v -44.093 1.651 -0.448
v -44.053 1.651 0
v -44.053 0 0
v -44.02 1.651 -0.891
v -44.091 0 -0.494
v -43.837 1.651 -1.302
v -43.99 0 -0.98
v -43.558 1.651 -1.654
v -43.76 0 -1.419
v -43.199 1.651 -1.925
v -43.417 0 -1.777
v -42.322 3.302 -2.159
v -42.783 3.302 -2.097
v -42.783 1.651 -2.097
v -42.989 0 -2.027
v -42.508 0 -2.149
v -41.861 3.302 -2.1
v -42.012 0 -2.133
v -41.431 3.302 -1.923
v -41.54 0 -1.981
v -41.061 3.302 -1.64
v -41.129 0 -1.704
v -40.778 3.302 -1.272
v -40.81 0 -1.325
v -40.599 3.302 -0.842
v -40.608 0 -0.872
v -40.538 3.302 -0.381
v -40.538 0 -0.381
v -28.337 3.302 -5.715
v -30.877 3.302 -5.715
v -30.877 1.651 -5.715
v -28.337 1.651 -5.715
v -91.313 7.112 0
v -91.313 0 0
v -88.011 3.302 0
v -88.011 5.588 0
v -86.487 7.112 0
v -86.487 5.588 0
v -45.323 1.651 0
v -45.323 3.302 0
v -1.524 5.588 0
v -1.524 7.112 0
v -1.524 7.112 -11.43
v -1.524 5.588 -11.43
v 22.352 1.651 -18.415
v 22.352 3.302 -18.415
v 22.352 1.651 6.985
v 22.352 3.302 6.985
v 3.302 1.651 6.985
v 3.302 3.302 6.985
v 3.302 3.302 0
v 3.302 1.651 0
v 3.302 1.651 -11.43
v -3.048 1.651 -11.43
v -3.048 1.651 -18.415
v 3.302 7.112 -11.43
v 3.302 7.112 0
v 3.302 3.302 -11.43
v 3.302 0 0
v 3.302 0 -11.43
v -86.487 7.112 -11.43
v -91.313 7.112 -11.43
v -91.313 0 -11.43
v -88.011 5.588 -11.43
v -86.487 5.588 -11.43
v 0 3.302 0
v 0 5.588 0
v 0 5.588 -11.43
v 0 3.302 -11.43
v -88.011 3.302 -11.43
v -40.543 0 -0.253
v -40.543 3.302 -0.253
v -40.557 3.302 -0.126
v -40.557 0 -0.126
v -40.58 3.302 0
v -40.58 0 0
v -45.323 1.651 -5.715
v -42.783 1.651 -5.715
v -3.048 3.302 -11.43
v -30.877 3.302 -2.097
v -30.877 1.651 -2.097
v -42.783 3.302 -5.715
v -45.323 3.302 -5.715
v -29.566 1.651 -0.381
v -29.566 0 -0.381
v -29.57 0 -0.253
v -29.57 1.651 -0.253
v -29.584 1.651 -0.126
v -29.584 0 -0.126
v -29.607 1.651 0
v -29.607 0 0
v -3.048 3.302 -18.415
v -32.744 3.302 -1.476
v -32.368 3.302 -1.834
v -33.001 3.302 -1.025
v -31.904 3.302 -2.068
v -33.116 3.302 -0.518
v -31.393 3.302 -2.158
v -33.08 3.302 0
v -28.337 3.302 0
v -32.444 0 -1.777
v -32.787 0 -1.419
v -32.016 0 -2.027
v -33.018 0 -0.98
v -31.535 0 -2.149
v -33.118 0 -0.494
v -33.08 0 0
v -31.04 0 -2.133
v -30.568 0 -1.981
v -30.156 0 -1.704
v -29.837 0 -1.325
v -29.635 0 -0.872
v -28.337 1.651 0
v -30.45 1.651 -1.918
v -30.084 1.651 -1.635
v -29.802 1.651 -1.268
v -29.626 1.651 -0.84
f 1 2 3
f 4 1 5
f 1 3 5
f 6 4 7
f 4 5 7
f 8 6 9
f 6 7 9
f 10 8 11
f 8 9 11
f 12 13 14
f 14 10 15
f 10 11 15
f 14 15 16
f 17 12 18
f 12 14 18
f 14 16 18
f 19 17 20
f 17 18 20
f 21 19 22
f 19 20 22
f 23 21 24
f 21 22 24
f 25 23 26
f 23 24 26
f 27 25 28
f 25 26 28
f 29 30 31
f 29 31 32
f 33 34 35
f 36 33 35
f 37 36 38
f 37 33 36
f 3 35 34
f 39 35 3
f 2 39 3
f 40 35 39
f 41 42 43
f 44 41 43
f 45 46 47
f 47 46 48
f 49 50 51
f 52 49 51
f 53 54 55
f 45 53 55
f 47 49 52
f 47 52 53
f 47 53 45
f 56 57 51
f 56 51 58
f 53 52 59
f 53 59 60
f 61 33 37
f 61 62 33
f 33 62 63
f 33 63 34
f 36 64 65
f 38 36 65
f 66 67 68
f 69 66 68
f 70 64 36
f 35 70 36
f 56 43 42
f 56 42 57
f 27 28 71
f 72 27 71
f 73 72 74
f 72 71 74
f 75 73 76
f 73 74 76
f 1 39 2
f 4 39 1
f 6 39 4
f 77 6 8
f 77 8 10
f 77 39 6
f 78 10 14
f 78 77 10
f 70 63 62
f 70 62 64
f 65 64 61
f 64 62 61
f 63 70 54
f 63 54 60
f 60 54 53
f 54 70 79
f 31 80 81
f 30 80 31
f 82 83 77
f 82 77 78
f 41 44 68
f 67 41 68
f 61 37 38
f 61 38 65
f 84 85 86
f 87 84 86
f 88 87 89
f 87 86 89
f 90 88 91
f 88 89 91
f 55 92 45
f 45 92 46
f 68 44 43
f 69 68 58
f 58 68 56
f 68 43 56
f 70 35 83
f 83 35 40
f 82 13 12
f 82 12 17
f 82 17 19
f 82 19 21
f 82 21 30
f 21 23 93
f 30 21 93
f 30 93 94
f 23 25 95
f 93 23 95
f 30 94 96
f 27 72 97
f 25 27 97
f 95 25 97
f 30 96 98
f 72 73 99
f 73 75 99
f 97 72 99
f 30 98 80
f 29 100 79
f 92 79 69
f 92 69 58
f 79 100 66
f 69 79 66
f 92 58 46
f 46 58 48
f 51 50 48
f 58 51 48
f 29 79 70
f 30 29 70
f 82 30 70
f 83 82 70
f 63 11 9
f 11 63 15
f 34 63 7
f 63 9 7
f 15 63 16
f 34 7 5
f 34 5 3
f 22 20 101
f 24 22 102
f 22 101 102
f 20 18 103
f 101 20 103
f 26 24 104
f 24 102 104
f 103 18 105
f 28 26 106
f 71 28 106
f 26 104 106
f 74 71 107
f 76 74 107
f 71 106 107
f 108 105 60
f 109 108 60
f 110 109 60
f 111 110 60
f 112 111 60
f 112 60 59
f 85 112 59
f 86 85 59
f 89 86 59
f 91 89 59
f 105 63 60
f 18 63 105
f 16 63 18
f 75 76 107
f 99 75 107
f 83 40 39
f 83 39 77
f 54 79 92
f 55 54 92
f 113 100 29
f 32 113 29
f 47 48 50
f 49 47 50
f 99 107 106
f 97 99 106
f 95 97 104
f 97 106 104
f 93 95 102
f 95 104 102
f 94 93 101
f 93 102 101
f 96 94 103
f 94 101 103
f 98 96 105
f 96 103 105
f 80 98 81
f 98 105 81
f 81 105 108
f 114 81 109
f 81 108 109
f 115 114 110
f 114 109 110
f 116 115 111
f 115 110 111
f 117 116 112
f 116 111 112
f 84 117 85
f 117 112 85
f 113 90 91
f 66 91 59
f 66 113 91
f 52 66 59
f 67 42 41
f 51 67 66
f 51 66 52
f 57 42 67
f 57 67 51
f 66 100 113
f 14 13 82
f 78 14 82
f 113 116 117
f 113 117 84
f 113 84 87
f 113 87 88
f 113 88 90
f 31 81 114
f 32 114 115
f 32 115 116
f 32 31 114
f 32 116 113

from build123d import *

# Parameters (mm, degrees)
BOSS_EXTRUDE1_DEPTH = 3.302
SKETCH2_W           = 11.43
SKETCH2_H           = 7.112
BOSS_EXTRUDE2_DEPTH = 3.302
SKETCH3_W           = 11.43
SKETCH3_H           = 7.112
BOSS_EXTRUDE3_DEPTH = 3.302
SKETCH4_W           = 1.524
SKETCH4_H           = 11.43
BOSS_EXTRUDE4_DEPTH = 1.524
SKETCH5_W           = 1.524
SKETCH5_H           = 11.43
BOSS_EXTRUDE5_DEPTH = 1.524
SKETCH7_W           = 2.54
SKETCH7_H           = 5.715
CUT_EXTRUDE1_DEPTH  = 1.651
BOSS_EXTRUDE8_START = -3.302
BOSS_EXTRUDE8_DEPTH = 1.651


with BuildPart() as part:
    # Sketch1 → Boss-Extrude1 (new body)
    with BuildSketch(Plane(origin=(0, 0, 0), x_dir=(1, 0, 0), z_dir=(0, 1, 0))):
        with BuildLine():
            Line((-29.60690112, 0), (0, 0))
            Line((0, 0), (0, 11.43))
            Line((0, 11.43), (-88.011, 11.43))
            Line((-88.011, 11.43), (-88.011, 0))
            Line((-88.011, 0), (-44.05309888, 0))
            ThreePointArc((-44.05309888, 0), (-42.508016011, 2.148644564), (-40.5384, 0.381))
            ThreePointArc((-40.5384, 0.381), (-40.548755436, 0.189383989), (-40.57970112, 0))
            Line((-40.57970112, 0), (-33.08029888, 0))
            ThreePointArc((-33.08029888, 0), (-31.535216011, 2.148644564), (-29.5656, 0.381))
            ThreePointArc((-29.5656, 0.381), (-29.575955436, 0.189383989), (-29.60690112, 0))
        make_face()
    extrude(amount=BOSS_EXTRUDE1_DEPTH)

    # Sketch2 → Boss-Extrude2 (add)
    with BuildSketch(Plane(origin=(0, 0, 0), x_dir=(0, 0, -1), z_dir=(1, 0, 0))):
        with Locations((5.715, 3.556)):
            Rectangle(SKETCH2_W, SKETCH2_H)
    extrude(amount=BOSS_EXTRUDE2_DEPTH)

    # Sketch3 → Boss-Extrude3 (add)
    with BuildSketch(Plane.ZY.offset(88.011)):
        with Locations((-5.715, 3.556)):
            Rectangle(SKETCH3_W, SKETCH3_H)
    extrude(amount=BOSS_EXTRUDE3_DEPTH)

    # Sketch4 → Boss-Extrude4 (add)
    with BuildSketch(Plane(origin=(0, 7.112, 0), x_dir=(1, 0, 0), z_dir=(0, 1, 0))):
        with Locations((-87.249, 5.715)):
            Rectangle(SKETCH4_W, SKETCH4_H)
    extrude(amount=-BOSS_EXTRUDE4_DEPTH)

    # Sketch5 → Boss-Extrude5 (add)
    with BuildSketch(Plane(origin=(0, 7.112, 0), x_dir=(1, 0, 0), z_dir=(0, 1, 0))):
        with Locations((-0.762, 5.715)):
            Rectangle(SKETCH5_W, SKETCH5_H)
    extrude(amount=-BOSS_EXTRUDE5_DEPTH)

    # Sketch7 → Cut-Extrude1 (cut)
    with BuildSketch(Plane(origin=(0, 3.302, 0), x_dir=(1, 0, 0), z_dir=(0, 1, 0))):
        with Locations((-44.05309888, 2.8575)):
            Rectangle(SKETCH7_W, SKETCH7_H)
        with Locations((-29.60690112, 2.8575)):
            Rectangle(SKETCH7_W, SKETCH7_H)
    extrude(amount=-CUT_EXTRUDE1_DEPTH, mode=Mode.SUBTRACT)

    # Sketch9 → Boss-Extrude8 (add)
    with BuildSketch(Plane.XZ.offset(BOSS_EXTRUDE8_START)):
        Polygon((-3.048, -11.43), (-3.048, -18.415), (22.352, -18.415), (22.352, 6.985), (3.302, 6.985), (3.302, 0), (3.302, -11.43), align=None)
    extrude(amount=BOSS_EXTRUDE8_DEPTH)


solid = part.part
